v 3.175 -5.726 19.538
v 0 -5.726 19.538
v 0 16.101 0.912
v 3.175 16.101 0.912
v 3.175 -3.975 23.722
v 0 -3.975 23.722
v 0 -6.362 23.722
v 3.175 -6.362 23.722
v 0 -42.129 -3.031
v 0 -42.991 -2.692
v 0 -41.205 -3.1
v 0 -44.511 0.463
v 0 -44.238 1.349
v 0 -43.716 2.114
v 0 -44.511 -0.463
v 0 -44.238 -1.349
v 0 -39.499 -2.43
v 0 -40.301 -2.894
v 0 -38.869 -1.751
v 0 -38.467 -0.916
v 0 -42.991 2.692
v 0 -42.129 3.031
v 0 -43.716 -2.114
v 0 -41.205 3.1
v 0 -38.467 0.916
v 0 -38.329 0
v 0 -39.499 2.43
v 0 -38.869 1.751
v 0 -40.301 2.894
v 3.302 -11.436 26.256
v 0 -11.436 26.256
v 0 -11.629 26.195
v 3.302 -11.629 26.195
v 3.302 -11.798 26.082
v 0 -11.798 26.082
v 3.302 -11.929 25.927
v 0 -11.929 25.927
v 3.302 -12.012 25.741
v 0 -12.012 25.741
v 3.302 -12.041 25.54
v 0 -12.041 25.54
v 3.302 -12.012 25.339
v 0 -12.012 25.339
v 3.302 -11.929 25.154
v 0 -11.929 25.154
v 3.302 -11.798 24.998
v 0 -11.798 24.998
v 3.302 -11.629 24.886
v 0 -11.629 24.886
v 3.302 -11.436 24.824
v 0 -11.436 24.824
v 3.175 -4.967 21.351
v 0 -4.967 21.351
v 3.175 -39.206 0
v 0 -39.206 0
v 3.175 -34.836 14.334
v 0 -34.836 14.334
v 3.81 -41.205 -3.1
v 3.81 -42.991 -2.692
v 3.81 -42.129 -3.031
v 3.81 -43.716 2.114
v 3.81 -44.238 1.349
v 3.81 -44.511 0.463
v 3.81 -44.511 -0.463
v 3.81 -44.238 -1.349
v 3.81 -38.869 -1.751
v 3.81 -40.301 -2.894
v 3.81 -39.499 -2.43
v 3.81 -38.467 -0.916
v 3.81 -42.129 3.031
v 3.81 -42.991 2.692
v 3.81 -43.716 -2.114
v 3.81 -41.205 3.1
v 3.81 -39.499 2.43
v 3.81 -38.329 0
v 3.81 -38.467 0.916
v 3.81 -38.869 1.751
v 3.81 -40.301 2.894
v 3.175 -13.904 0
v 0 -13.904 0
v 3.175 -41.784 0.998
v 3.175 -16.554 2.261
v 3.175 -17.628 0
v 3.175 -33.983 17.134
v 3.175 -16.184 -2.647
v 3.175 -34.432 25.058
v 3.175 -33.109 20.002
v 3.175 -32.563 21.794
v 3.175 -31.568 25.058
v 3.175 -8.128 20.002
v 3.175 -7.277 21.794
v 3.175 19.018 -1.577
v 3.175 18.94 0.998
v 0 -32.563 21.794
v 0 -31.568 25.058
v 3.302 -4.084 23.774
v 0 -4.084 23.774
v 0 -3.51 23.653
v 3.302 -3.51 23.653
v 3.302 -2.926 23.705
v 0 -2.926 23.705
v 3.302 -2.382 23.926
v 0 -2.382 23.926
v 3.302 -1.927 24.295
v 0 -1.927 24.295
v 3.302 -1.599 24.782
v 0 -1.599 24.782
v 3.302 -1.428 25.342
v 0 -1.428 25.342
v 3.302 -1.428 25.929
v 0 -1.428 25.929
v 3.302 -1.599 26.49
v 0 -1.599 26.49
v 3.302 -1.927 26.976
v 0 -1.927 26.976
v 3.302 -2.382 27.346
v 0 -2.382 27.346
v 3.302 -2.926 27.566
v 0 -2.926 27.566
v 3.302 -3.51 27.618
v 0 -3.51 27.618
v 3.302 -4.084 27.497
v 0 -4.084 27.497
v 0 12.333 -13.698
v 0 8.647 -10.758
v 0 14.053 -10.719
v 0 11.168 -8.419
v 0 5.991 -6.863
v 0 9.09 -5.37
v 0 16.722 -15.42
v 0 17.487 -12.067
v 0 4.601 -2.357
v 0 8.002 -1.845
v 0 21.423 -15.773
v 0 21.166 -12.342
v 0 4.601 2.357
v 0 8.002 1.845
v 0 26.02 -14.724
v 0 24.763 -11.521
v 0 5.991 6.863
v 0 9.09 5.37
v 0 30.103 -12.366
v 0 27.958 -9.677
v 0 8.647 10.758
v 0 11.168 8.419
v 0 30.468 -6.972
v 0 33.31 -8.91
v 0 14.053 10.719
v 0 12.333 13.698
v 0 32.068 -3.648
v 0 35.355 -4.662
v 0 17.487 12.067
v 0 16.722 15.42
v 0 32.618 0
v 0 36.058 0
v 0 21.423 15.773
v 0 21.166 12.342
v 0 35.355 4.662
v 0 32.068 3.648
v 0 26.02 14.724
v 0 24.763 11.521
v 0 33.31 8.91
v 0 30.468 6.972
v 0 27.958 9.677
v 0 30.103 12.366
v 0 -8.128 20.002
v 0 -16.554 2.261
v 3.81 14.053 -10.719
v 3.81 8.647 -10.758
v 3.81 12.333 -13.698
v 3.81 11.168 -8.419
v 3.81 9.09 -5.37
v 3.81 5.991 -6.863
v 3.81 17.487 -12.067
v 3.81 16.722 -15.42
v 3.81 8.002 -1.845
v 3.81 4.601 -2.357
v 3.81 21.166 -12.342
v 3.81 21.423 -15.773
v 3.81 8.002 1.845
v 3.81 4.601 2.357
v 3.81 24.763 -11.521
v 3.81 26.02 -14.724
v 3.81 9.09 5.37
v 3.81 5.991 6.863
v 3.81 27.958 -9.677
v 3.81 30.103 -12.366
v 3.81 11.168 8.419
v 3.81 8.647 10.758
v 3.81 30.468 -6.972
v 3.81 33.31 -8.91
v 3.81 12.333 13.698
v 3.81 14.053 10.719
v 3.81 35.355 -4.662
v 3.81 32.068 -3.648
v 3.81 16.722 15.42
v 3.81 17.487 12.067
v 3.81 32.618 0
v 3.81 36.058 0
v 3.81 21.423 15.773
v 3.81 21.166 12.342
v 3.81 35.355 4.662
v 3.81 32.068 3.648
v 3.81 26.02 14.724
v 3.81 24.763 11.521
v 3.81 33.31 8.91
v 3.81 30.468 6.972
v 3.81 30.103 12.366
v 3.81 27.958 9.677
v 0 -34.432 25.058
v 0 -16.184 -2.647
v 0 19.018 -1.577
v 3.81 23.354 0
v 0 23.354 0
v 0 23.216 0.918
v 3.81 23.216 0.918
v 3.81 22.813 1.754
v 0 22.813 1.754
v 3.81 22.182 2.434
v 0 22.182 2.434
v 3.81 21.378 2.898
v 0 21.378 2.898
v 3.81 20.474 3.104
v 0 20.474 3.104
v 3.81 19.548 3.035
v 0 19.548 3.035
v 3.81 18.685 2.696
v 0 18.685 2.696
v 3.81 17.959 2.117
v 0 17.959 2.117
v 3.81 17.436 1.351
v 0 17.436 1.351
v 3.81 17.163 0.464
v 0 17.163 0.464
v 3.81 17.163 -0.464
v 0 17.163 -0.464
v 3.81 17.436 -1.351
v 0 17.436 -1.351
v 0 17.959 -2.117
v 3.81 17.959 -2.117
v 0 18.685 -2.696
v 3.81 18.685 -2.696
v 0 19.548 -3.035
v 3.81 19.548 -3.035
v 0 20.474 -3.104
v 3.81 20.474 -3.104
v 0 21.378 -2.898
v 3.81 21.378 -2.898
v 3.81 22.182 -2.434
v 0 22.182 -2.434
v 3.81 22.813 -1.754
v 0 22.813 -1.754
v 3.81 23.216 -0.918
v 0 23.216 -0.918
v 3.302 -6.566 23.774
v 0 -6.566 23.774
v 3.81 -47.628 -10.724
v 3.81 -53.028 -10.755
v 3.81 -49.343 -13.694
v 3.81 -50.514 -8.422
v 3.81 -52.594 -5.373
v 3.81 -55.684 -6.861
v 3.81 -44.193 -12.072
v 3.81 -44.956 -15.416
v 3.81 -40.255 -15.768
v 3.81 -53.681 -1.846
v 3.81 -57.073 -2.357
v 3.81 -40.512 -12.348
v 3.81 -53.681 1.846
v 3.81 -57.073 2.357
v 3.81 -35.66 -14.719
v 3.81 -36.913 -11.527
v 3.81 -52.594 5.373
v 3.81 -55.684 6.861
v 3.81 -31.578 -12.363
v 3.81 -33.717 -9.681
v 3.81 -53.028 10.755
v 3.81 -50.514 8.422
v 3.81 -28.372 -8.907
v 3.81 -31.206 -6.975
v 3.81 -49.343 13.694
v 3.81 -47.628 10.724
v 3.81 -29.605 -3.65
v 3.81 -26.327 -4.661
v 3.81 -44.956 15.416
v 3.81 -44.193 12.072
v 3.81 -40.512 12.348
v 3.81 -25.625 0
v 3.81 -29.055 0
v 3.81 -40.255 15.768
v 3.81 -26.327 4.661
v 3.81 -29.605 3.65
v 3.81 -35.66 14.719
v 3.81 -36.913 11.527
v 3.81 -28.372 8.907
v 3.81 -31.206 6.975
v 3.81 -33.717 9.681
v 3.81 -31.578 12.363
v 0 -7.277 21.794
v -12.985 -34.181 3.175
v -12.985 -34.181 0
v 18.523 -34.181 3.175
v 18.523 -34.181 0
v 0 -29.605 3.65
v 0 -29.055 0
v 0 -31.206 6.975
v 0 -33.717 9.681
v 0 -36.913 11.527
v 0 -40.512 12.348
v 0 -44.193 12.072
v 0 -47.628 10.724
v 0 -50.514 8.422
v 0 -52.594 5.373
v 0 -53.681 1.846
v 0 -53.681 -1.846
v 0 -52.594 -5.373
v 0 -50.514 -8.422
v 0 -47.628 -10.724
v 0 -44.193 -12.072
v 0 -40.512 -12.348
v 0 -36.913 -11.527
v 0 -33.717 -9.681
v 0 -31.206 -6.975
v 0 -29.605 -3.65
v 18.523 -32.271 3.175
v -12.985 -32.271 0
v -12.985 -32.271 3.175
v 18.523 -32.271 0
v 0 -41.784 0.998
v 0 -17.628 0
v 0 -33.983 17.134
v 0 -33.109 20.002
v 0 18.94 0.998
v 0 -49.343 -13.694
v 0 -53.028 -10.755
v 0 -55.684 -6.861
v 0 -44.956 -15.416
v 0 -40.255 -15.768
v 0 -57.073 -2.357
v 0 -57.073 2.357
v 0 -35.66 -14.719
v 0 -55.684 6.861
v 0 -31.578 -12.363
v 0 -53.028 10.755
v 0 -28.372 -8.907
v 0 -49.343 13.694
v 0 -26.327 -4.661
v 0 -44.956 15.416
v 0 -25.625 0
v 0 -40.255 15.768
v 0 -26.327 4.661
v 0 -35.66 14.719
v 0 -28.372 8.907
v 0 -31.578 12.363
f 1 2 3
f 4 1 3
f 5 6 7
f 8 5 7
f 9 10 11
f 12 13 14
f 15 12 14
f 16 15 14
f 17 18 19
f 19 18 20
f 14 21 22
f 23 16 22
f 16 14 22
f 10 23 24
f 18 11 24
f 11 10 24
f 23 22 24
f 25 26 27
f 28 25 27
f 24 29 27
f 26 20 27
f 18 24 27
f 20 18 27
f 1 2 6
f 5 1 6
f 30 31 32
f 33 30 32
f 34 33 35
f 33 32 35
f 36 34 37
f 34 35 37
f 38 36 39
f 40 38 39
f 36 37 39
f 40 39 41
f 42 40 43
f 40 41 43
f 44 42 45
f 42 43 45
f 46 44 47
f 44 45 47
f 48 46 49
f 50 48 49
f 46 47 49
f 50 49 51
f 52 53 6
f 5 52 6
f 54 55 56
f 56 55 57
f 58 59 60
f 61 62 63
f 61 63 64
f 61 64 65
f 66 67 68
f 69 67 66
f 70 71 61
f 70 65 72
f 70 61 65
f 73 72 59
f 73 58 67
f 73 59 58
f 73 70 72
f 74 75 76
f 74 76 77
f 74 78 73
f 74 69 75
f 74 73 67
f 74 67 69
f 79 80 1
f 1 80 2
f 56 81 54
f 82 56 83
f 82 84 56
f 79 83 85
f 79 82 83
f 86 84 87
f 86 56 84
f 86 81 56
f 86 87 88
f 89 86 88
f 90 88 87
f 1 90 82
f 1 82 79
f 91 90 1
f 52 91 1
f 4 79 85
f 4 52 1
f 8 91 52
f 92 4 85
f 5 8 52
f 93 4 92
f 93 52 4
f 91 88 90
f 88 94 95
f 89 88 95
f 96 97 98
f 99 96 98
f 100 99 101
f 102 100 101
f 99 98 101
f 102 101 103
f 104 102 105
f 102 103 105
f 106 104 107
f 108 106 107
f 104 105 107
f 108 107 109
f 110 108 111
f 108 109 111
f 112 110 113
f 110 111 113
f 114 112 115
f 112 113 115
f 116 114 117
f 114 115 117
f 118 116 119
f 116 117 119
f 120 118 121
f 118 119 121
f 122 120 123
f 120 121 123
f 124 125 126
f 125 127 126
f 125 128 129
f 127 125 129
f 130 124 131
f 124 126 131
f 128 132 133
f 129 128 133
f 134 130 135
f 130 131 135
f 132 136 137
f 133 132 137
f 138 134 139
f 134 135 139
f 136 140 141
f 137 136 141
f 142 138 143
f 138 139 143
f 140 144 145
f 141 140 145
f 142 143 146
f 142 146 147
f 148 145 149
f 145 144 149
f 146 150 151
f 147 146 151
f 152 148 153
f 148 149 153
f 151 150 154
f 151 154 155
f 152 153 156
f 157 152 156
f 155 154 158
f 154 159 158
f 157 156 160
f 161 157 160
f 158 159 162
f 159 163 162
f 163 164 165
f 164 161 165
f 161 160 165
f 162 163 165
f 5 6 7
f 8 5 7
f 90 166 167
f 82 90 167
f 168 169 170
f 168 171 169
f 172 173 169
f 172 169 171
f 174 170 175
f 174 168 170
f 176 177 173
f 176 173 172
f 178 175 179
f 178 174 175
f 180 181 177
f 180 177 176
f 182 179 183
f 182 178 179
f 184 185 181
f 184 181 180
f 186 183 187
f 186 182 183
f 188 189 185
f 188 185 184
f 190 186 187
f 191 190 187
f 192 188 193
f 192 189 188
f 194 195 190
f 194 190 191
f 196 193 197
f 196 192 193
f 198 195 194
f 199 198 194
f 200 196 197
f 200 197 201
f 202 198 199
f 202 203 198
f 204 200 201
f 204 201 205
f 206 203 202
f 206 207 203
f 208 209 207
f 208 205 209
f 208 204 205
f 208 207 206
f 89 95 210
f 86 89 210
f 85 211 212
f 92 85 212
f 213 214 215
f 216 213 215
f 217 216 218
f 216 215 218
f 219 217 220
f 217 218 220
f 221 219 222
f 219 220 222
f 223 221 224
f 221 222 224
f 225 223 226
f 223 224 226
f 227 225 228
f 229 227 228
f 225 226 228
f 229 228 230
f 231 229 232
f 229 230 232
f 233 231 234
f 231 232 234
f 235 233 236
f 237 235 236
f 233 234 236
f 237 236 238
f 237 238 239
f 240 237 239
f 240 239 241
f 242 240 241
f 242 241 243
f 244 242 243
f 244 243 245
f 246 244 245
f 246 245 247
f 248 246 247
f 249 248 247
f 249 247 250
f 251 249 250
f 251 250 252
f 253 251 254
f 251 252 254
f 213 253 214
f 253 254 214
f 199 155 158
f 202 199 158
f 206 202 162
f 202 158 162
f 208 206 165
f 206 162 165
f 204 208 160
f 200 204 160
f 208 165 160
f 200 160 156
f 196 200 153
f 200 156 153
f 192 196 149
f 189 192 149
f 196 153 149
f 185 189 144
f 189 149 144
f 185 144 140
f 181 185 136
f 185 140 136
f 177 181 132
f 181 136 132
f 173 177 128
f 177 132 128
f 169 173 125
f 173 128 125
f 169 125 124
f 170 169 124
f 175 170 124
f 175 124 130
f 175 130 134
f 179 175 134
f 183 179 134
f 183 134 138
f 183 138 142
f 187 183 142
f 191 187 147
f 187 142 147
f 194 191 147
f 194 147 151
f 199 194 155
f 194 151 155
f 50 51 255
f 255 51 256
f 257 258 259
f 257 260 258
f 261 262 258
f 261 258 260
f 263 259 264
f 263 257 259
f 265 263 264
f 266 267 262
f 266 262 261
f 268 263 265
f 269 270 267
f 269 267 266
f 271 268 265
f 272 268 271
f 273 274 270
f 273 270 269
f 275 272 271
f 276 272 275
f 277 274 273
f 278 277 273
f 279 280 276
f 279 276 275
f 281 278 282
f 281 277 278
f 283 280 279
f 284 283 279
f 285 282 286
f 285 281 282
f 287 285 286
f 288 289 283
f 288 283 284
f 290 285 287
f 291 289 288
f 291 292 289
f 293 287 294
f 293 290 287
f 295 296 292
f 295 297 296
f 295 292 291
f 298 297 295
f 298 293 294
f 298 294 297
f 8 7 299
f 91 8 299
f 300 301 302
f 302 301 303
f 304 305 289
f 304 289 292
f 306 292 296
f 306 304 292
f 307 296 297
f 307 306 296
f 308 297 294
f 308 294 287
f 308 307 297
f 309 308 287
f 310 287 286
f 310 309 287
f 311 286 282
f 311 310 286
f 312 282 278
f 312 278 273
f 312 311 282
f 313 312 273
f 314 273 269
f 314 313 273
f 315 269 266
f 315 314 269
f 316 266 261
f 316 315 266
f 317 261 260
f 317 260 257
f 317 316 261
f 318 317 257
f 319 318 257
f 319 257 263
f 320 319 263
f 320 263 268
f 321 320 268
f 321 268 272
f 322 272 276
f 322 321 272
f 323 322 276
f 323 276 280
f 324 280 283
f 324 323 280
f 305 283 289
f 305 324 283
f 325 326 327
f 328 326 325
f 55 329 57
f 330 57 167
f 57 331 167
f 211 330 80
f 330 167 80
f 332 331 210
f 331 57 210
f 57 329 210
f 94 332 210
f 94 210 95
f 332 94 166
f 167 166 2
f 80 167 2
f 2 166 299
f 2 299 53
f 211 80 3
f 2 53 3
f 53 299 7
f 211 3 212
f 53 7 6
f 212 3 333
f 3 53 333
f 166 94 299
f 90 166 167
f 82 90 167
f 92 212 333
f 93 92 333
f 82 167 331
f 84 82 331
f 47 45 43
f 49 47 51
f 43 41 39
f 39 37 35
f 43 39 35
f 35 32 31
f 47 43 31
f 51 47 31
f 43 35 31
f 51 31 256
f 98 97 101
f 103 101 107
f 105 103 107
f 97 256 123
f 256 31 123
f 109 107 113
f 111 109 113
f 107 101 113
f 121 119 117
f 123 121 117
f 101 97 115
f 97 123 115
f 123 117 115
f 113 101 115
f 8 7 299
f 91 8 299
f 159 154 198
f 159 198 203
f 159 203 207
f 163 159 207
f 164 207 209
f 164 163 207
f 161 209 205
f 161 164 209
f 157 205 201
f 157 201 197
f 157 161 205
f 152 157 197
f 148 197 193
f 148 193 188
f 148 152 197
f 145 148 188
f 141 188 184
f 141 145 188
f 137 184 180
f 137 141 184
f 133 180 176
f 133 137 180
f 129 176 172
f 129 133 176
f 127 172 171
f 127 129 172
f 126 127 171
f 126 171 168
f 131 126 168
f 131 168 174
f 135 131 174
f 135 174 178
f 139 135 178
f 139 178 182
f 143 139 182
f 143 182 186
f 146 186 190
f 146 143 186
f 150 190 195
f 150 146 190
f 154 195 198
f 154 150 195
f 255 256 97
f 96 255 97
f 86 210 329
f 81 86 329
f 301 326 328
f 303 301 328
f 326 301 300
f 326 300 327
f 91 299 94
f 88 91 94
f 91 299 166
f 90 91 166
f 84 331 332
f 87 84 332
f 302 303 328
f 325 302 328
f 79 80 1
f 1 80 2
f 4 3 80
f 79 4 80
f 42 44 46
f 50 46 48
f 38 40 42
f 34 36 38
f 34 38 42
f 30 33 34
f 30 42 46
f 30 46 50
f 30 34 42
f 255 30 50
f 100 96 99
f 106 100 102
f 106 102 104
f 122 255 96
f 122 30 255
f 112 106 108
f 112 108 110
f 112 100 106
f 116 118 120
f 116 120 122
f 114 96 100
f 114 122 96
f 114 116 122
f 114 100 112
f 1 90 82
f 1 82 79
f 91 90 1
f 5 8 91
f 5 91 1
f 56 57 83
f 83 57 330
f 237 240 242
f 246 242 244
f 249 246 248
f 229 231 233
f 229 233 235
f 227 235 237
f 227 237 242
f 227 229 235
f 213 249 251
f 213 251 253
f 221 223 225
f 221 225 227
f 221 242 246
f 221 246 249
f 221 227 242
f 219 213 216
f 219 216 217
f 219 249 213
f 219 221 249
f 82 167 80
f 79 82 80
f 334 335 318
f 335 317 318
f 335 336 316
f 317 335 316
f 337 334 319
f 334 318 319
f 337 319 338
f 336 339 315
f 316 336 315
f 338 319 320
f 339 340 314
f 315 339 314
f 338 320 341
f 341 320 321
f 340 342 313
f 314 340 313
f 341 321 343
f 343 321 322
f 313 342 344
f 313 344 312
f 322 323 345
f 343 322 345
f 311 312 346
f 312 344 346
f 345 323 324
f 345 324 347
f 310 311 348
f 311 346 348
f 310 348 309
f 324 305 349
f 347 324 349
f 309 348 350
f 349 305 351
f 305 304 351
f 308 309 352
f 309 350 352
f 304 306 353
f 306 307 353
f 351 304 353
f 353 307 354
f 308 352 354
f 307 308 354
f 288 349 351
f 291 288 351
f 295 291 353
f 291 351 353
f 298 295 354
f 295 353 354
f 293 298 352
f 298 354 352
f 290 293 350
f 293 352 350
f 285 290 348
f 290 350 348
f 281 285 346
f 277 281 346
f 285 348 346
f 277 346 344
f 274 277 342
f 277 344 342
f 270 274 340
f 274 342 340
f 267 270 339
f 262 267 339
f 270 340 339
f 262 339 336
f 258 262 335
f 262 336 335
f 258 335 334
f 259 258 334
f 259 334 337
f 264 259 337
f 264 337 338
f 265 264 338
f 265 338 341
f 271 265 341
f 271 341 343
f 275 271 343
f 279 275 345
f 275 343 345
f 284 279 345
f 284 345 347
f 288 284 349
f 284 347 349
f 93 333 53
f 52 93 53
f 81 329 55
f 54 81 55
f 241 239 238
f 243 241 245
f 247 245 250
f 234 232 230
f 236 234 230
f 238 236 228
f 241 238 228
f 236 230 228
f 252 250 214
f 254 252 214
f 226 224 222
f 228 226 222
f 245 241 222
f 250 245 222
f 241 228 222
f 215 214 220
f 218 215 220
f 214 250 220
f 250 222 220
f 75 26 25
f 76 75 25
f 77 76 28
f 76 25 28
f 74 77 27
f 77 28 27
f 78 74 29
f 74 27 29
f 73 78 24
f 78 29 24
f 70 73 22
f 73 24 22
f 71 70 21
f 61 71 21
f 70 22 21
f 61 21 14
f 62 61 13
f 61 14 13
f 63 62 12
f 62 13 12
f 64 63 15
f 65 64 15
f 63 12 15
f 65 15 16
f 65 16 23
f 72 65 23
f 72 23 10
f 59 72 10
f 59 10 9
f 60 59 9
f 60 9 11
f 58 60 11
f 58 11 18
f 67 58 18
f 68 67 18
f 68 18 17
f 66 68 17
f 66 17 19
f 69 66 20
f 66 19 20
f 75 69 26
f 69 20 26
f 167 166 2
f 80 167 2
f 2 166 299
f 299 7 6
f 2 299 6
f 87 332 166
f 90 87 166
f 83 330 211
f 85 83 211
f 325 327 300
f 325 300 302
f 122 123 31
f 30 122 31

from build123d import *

# Parameters (mm, degrees)
F0_R      = 15.8123837024
F0_R_2    = 12.3826401133
F2_DEPTH  = 3.81
F0_R_3    = 3.1085165774
F1_R      = 15.8168802923
F1_R_2    = 12.3770214214
F3_DEPTH  = 3.81
F1_R_3    = 3.1129993009
F5_DEPTH  = 3.175
F6_DEPTH  = 3.175
F7_W      = 31.5075162798
F7_H      = 1.9095465541
F8_DEPTH  = 3.175
F10_DEPTH = 3.302


with BuildPart() as f2:
    # F0 (on Right) → F2 (new body)
    with BuildSketch(Plane.YZ):
        with Locations((-41.4371602237, 0)):
            Circle(F0_R)
        with Locations((-41.4371602237, 0)):
            Circle(F0_R_2, mode=Mode.SUBTRACT)
    extrude(amount=F2_DEPTH)


with BuildPart() as f2b:
    # F0 (on Right) → F2, piece 2 (new body)
    with BuildSketch(Plane.YZ):
        with Locations((-41.4371602237, 0)):
            Circle(F0_R_3)
    extrude(amount=F2_DEPTH)


with BuildPart() as f3:
    # F1 (on Right) → F3 (new body)
    with BuildSketch(Plane.YZ):
        with Locations((20.2411916107, 0)):
            Circle(F1_R)
        with Locations((20.2411916107, 0)):
            Circle(F1_R_2, mode=Mode.SUBTRACT)
    extrude(amount=F3_DEPTH)


with BuildPart() as f3b:
    # F1 (on Right) → F3, piece 2 (new body)
    with BuildSketch(Plane.YZ):
        with Locations((20.2411916107, 0)):
            Circle(F1_R_3)
    extrude(amount=F3_DEPTH)


with BuildPart() as f5:
    # F4 (on Right) → F5 (new body)
    with BuildSketch(Plane.YZ):
        Polygon((-6.3615562394, 23.7216372043), (-7.2772825496, 21.7935438685), (-8.1280829839, 20.0021542042), (-16.5539788906, 2.261139706), (-13.9042651281, 0), (-5.7258781987, 19.5379385445), (-4.9671542544, 21.3505089113), (-3.9746235125, 23.7216372043), align=None)
    extrude(amount=F5_DEPTH)


with BuildPart() as f6:
    # F4 (on Right) → F6 (new body)
    with BuildSketch(Plane.YZ):
        Polygon((-34.4318896532, 25.0583179295), (-41.7836457491, 0.9980315808), (-39.2057560384, 0), (-34.8363752453, 14.3344676299), (-33.9829678651, 17.1342099836), (-33.1087714375, 20.0021542042), (-32.5627264923, 21.7935438685), (-31.5675698221, 25.0583179295), align=None)
        Polygon((-33.9829678651, 17.1342099836), (-34.8363752453, 14.3344676299), (-17.6278818399, 0), (-16.5539788906, 2.261139706), align=None)
        Polygon((-7.2772825496, 21.7935438685), (-32.5627264923, 21.7935438685), (-33.1087714375, 20.0021542042), (-8.1280829839, 20.0021542042), align=None)
        Polygon((-16.5539788906, 2.261139706), (-17.6278818399, 0), (-13.9042651281, 0), align=None)
        Polygon((-13.9042651281, 0), (-17.6278818399, 0), (-16.1835990411, -2.6471492632), (19.018196273, -1.5774777948), (16.1011736358, 0.9117705916), align=None)
        Polygon((-6.3615562394, 23.7216372043), (-7.2772825496, 21.7935438685), (-8.1280829839, 20.0021542042), (-16.5539788906, 2.261139706), (-13.9042651281, 0), (-5.7258781987, 19.5379385445), (-4.9671542544, 21.3505089113), (-3.9746235125, 23.7216372043), align=None)
        Polygon((-5.7258781987, 19.5379385445), (16.1011736358, 0.9117705916), (18.9399346709, 0.9980315808), (-4.9671542544, 21.3505089113), align=None)
        Polygon((18.9399346709, 0.9980315808), (16.1011736358, 0.9117705916), (19.018196273, -1.5774777948), align=None)
    extrude(amount=F6_DEPTH)


with BuildPart() as f8:
    # F7 (on Top) → F8 (new body)
    with BuildSketch(Plane.XY):
        with Locations((2.7688415721, -33.2261100411)):
            Rectangle(F7_W, F7_H)
    extrude(amount=F8_DEPTH)


with BuildPart() as f10:
    # F9 (on Right) → F10 (new body)
    with BuildSketch(Plane.YZ):
        with BuildLine():
            Line((-6.5662190318, 23.7738545984), (-4.0838085115, 23.7738545984))
            ThreePointArc((-4.0838085115, 23.7738545984), (-1.4064656713, 25.6356624886), (-4.0838085115, 27.4974703789))
            Line((-4.0838085115, 27.4974703789), (-11.4355627447, 26.2562651187))
            ThreePointArc((-11.4355627447, 26.2562651187), (-12.0408799384, 25.5401851609), (-11.4355627447, 24.8241052032))
            Line((-11.4355627447, 24.8241052032), (-6.5662190318, 23.7738545984))
        make_face()
    extrude(amount=F10_DEPTH)


solid = Compound([f2.part, f2b.part, f3.part, f3b.part, f5.part, f6.part, f8.part, f10.part])
